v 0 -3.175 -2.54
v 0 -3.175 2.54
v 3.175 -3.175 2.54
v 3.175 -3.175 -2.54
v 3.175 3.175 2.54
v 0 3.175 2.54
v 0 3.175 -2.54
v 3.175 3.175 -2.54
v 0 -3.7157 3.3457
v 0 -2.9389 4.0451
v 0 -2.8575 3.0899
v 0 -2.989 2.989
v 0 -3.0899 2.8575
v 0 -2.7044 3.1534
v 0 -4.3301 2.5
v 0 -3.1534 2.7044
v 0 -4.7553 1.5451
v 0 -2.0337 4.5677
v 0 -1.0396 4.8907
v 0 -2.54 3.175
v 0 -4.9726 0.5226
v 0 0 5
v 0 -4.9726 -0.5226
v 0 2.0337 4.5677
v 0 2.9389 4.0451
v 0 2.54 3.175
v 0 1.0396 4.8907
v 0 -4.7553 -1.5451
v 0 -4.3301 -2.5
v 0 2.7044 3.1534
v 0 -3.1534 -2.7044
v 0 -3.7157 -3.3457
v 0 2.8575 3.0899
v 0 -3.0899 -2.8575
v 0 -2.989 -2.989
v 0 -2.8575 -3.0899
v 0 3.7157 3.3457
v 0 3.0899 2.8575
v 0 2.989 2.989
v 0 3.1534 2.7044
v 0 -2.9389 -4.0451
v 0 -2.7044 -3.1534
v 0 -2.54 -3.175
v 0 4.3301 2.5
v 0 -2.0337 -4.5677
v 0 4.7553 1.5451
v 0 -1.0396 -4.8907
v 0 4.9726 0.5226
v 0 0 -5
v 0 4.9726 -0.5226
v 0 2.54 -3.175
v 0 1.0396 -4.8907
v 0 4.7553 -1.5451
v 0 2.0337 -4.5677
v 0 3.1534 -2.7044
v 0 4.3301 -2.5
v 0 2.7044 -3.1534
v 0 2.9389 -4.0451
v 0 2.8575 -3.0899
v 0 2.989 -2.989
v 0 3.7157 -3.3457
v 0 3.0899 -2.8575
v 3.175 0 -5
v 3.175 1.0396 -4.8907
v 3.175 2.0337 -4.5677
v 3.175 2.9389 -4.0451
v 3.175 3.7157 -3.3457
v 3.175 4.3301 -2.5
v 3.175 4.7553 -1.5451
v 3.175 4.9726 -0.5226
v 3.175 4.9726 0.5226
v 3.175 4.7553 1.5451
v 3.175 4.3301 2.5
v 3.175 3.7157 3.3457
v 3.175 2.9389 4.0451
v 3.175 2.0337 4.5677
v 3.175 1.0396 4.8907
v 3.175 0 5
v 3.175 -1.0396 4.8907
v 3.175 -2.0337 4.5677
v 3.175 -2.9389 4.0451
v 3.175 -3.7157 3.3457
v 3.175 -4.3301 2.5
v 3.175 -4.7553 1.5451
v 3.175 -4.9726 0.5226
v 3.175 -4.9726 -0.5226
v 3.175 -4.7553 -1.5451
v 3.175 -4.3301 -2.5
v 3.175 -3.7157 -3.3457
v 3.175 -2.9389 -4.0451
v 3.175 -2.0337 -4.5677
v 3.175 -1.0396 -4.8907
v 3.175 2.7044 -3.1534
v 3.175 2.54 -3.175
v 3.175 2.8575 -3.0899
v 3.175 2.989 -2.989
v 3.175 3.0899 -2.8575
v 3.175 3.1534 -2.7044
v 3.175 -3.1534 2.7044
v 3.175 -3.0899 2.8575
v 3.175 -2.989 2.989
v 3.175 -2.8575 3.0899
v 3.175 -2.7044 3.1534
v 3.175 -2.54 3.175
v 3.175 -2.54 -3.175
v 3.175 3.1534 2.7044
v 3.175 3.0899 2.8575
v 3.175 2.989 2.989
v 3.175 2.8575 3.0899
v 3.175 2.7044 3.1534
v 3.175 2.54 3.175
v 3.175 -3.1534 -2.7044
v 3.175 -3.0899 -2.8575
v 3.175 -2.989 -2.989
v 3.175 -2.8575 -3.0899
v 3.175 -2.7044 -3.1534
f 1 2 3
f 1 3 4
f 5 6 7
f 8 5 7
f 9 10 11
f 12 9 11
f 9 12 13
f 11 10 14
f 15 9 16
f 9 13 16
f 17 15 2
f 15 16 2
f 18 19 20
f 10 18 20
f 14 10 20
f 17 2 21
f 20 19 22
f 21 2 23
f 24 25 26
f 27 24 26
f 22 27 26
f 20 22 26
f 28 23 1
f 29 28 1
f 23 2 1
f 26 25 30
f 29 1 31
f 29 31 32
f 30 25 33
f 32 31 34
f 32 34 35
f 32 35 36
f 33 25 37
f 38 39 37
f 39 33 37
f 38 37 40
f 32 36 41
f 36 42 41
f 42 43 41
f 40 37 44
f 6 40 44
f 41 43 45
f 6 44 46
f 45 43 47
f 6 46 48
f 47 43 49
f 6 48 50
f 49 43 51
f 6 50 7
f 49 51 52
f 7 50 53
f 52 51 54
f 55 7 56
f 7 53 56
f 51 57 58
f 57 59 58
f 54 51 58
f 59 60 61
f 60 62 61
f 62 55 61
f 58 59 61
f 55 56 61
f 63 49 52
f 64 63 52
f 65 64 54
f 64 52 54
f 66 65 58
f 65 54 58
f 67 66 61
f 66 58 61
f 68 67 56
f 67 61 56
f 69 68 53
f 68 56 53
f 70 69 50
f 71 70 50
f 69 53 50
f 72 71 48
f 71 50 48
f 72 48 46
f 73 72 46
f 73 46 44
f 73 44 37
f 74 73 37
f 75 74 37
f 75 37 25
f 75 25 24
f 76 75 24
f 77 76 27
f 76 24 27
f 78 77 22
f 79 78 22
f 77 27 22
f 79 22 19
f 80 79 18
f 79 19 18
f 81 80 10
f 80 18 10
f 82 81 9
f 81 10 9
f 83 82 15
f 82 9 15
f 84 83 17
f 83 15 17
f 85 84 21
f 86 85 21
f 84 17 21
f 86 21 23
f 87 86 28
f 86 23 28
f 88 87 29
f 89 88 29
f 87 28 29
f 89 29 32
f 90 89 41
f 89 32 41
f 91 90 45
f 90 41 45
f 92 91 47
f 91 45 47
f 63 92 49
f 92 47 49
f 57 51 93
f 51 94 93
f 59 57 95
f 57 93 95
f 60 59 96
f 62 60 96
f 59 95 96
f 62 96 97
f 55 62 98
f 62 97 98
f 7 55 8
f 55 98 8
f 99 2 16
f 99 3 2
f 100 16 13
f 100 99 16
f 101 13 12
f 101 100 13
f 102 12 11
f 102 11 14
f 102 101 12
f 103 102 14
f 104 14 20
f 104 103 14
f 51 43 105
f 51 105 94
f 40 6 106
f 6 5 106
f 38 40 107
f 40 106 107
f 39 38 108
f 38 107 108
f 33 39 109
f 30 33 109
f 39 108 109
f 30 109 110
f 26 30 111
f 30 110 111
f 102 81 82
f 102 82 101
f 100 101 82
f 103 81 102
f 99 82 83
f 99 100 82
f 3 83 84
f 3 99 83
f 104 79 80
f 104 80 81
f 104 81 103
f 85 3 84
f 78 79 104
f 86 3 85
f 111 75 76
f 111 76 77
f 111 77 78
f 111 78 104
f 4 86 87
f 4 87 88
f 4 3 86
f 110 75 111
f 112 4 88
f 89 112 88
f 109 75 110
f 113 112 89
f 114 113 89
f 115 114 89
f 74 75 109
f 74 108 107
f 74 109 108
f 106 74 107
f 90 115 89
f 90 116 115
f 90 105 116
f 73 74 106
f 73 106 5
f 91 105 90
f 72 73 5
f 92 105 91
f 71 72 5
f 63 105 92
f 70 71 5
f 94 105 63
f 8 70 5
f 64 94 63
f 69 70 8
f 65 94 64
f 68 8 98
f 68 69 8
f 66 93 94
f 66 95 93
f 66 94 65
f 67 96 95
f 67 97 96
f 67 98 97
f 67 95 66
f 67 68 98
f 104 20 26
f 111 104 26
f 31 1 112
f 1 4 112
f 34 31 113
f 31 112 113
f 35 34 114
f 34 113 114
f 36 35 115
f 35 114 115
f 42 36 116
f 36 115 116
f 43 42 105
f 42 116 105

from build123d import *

# Parameters (mm, degrees)
SKETCH1_R           = 5
SKETCH1_W           = 6.35
SKETCH1_H           = 6.35
BOSS_EXTRUDE1_DEPTH = 3.175
FILLET1_R           = 0.635


with BuildPart() as part:
    # Sketch1 → Boss-Extrude1 (new body)
    with BuildSketch(Plane(origin=(0, 0, 0), x_dir=(0, 0, -1), z_dir=(1, 0, 0))):
        Circle(SKETCH1_R)
        Rectangle(SKETCH1_W, SKETCH1_H, mode=Mode.SUBTRACT)
    extrude(amount=BOSS_EXTRUDE1_DEPTH)

    # Fillet1
    fillet1_edges = [part.edges().sort_by_distance(p)[0] for p in [
        (1.5875, -3.175, 3.175),
        (1.5875, -3.175, -3.175),
        (1.5875, 3.175, -3.175),
        (1.5875, 3.175, 3.175),
    ]]
    fillet(fillet1_edges, radius=FILLET1_R)


solid = part.part
